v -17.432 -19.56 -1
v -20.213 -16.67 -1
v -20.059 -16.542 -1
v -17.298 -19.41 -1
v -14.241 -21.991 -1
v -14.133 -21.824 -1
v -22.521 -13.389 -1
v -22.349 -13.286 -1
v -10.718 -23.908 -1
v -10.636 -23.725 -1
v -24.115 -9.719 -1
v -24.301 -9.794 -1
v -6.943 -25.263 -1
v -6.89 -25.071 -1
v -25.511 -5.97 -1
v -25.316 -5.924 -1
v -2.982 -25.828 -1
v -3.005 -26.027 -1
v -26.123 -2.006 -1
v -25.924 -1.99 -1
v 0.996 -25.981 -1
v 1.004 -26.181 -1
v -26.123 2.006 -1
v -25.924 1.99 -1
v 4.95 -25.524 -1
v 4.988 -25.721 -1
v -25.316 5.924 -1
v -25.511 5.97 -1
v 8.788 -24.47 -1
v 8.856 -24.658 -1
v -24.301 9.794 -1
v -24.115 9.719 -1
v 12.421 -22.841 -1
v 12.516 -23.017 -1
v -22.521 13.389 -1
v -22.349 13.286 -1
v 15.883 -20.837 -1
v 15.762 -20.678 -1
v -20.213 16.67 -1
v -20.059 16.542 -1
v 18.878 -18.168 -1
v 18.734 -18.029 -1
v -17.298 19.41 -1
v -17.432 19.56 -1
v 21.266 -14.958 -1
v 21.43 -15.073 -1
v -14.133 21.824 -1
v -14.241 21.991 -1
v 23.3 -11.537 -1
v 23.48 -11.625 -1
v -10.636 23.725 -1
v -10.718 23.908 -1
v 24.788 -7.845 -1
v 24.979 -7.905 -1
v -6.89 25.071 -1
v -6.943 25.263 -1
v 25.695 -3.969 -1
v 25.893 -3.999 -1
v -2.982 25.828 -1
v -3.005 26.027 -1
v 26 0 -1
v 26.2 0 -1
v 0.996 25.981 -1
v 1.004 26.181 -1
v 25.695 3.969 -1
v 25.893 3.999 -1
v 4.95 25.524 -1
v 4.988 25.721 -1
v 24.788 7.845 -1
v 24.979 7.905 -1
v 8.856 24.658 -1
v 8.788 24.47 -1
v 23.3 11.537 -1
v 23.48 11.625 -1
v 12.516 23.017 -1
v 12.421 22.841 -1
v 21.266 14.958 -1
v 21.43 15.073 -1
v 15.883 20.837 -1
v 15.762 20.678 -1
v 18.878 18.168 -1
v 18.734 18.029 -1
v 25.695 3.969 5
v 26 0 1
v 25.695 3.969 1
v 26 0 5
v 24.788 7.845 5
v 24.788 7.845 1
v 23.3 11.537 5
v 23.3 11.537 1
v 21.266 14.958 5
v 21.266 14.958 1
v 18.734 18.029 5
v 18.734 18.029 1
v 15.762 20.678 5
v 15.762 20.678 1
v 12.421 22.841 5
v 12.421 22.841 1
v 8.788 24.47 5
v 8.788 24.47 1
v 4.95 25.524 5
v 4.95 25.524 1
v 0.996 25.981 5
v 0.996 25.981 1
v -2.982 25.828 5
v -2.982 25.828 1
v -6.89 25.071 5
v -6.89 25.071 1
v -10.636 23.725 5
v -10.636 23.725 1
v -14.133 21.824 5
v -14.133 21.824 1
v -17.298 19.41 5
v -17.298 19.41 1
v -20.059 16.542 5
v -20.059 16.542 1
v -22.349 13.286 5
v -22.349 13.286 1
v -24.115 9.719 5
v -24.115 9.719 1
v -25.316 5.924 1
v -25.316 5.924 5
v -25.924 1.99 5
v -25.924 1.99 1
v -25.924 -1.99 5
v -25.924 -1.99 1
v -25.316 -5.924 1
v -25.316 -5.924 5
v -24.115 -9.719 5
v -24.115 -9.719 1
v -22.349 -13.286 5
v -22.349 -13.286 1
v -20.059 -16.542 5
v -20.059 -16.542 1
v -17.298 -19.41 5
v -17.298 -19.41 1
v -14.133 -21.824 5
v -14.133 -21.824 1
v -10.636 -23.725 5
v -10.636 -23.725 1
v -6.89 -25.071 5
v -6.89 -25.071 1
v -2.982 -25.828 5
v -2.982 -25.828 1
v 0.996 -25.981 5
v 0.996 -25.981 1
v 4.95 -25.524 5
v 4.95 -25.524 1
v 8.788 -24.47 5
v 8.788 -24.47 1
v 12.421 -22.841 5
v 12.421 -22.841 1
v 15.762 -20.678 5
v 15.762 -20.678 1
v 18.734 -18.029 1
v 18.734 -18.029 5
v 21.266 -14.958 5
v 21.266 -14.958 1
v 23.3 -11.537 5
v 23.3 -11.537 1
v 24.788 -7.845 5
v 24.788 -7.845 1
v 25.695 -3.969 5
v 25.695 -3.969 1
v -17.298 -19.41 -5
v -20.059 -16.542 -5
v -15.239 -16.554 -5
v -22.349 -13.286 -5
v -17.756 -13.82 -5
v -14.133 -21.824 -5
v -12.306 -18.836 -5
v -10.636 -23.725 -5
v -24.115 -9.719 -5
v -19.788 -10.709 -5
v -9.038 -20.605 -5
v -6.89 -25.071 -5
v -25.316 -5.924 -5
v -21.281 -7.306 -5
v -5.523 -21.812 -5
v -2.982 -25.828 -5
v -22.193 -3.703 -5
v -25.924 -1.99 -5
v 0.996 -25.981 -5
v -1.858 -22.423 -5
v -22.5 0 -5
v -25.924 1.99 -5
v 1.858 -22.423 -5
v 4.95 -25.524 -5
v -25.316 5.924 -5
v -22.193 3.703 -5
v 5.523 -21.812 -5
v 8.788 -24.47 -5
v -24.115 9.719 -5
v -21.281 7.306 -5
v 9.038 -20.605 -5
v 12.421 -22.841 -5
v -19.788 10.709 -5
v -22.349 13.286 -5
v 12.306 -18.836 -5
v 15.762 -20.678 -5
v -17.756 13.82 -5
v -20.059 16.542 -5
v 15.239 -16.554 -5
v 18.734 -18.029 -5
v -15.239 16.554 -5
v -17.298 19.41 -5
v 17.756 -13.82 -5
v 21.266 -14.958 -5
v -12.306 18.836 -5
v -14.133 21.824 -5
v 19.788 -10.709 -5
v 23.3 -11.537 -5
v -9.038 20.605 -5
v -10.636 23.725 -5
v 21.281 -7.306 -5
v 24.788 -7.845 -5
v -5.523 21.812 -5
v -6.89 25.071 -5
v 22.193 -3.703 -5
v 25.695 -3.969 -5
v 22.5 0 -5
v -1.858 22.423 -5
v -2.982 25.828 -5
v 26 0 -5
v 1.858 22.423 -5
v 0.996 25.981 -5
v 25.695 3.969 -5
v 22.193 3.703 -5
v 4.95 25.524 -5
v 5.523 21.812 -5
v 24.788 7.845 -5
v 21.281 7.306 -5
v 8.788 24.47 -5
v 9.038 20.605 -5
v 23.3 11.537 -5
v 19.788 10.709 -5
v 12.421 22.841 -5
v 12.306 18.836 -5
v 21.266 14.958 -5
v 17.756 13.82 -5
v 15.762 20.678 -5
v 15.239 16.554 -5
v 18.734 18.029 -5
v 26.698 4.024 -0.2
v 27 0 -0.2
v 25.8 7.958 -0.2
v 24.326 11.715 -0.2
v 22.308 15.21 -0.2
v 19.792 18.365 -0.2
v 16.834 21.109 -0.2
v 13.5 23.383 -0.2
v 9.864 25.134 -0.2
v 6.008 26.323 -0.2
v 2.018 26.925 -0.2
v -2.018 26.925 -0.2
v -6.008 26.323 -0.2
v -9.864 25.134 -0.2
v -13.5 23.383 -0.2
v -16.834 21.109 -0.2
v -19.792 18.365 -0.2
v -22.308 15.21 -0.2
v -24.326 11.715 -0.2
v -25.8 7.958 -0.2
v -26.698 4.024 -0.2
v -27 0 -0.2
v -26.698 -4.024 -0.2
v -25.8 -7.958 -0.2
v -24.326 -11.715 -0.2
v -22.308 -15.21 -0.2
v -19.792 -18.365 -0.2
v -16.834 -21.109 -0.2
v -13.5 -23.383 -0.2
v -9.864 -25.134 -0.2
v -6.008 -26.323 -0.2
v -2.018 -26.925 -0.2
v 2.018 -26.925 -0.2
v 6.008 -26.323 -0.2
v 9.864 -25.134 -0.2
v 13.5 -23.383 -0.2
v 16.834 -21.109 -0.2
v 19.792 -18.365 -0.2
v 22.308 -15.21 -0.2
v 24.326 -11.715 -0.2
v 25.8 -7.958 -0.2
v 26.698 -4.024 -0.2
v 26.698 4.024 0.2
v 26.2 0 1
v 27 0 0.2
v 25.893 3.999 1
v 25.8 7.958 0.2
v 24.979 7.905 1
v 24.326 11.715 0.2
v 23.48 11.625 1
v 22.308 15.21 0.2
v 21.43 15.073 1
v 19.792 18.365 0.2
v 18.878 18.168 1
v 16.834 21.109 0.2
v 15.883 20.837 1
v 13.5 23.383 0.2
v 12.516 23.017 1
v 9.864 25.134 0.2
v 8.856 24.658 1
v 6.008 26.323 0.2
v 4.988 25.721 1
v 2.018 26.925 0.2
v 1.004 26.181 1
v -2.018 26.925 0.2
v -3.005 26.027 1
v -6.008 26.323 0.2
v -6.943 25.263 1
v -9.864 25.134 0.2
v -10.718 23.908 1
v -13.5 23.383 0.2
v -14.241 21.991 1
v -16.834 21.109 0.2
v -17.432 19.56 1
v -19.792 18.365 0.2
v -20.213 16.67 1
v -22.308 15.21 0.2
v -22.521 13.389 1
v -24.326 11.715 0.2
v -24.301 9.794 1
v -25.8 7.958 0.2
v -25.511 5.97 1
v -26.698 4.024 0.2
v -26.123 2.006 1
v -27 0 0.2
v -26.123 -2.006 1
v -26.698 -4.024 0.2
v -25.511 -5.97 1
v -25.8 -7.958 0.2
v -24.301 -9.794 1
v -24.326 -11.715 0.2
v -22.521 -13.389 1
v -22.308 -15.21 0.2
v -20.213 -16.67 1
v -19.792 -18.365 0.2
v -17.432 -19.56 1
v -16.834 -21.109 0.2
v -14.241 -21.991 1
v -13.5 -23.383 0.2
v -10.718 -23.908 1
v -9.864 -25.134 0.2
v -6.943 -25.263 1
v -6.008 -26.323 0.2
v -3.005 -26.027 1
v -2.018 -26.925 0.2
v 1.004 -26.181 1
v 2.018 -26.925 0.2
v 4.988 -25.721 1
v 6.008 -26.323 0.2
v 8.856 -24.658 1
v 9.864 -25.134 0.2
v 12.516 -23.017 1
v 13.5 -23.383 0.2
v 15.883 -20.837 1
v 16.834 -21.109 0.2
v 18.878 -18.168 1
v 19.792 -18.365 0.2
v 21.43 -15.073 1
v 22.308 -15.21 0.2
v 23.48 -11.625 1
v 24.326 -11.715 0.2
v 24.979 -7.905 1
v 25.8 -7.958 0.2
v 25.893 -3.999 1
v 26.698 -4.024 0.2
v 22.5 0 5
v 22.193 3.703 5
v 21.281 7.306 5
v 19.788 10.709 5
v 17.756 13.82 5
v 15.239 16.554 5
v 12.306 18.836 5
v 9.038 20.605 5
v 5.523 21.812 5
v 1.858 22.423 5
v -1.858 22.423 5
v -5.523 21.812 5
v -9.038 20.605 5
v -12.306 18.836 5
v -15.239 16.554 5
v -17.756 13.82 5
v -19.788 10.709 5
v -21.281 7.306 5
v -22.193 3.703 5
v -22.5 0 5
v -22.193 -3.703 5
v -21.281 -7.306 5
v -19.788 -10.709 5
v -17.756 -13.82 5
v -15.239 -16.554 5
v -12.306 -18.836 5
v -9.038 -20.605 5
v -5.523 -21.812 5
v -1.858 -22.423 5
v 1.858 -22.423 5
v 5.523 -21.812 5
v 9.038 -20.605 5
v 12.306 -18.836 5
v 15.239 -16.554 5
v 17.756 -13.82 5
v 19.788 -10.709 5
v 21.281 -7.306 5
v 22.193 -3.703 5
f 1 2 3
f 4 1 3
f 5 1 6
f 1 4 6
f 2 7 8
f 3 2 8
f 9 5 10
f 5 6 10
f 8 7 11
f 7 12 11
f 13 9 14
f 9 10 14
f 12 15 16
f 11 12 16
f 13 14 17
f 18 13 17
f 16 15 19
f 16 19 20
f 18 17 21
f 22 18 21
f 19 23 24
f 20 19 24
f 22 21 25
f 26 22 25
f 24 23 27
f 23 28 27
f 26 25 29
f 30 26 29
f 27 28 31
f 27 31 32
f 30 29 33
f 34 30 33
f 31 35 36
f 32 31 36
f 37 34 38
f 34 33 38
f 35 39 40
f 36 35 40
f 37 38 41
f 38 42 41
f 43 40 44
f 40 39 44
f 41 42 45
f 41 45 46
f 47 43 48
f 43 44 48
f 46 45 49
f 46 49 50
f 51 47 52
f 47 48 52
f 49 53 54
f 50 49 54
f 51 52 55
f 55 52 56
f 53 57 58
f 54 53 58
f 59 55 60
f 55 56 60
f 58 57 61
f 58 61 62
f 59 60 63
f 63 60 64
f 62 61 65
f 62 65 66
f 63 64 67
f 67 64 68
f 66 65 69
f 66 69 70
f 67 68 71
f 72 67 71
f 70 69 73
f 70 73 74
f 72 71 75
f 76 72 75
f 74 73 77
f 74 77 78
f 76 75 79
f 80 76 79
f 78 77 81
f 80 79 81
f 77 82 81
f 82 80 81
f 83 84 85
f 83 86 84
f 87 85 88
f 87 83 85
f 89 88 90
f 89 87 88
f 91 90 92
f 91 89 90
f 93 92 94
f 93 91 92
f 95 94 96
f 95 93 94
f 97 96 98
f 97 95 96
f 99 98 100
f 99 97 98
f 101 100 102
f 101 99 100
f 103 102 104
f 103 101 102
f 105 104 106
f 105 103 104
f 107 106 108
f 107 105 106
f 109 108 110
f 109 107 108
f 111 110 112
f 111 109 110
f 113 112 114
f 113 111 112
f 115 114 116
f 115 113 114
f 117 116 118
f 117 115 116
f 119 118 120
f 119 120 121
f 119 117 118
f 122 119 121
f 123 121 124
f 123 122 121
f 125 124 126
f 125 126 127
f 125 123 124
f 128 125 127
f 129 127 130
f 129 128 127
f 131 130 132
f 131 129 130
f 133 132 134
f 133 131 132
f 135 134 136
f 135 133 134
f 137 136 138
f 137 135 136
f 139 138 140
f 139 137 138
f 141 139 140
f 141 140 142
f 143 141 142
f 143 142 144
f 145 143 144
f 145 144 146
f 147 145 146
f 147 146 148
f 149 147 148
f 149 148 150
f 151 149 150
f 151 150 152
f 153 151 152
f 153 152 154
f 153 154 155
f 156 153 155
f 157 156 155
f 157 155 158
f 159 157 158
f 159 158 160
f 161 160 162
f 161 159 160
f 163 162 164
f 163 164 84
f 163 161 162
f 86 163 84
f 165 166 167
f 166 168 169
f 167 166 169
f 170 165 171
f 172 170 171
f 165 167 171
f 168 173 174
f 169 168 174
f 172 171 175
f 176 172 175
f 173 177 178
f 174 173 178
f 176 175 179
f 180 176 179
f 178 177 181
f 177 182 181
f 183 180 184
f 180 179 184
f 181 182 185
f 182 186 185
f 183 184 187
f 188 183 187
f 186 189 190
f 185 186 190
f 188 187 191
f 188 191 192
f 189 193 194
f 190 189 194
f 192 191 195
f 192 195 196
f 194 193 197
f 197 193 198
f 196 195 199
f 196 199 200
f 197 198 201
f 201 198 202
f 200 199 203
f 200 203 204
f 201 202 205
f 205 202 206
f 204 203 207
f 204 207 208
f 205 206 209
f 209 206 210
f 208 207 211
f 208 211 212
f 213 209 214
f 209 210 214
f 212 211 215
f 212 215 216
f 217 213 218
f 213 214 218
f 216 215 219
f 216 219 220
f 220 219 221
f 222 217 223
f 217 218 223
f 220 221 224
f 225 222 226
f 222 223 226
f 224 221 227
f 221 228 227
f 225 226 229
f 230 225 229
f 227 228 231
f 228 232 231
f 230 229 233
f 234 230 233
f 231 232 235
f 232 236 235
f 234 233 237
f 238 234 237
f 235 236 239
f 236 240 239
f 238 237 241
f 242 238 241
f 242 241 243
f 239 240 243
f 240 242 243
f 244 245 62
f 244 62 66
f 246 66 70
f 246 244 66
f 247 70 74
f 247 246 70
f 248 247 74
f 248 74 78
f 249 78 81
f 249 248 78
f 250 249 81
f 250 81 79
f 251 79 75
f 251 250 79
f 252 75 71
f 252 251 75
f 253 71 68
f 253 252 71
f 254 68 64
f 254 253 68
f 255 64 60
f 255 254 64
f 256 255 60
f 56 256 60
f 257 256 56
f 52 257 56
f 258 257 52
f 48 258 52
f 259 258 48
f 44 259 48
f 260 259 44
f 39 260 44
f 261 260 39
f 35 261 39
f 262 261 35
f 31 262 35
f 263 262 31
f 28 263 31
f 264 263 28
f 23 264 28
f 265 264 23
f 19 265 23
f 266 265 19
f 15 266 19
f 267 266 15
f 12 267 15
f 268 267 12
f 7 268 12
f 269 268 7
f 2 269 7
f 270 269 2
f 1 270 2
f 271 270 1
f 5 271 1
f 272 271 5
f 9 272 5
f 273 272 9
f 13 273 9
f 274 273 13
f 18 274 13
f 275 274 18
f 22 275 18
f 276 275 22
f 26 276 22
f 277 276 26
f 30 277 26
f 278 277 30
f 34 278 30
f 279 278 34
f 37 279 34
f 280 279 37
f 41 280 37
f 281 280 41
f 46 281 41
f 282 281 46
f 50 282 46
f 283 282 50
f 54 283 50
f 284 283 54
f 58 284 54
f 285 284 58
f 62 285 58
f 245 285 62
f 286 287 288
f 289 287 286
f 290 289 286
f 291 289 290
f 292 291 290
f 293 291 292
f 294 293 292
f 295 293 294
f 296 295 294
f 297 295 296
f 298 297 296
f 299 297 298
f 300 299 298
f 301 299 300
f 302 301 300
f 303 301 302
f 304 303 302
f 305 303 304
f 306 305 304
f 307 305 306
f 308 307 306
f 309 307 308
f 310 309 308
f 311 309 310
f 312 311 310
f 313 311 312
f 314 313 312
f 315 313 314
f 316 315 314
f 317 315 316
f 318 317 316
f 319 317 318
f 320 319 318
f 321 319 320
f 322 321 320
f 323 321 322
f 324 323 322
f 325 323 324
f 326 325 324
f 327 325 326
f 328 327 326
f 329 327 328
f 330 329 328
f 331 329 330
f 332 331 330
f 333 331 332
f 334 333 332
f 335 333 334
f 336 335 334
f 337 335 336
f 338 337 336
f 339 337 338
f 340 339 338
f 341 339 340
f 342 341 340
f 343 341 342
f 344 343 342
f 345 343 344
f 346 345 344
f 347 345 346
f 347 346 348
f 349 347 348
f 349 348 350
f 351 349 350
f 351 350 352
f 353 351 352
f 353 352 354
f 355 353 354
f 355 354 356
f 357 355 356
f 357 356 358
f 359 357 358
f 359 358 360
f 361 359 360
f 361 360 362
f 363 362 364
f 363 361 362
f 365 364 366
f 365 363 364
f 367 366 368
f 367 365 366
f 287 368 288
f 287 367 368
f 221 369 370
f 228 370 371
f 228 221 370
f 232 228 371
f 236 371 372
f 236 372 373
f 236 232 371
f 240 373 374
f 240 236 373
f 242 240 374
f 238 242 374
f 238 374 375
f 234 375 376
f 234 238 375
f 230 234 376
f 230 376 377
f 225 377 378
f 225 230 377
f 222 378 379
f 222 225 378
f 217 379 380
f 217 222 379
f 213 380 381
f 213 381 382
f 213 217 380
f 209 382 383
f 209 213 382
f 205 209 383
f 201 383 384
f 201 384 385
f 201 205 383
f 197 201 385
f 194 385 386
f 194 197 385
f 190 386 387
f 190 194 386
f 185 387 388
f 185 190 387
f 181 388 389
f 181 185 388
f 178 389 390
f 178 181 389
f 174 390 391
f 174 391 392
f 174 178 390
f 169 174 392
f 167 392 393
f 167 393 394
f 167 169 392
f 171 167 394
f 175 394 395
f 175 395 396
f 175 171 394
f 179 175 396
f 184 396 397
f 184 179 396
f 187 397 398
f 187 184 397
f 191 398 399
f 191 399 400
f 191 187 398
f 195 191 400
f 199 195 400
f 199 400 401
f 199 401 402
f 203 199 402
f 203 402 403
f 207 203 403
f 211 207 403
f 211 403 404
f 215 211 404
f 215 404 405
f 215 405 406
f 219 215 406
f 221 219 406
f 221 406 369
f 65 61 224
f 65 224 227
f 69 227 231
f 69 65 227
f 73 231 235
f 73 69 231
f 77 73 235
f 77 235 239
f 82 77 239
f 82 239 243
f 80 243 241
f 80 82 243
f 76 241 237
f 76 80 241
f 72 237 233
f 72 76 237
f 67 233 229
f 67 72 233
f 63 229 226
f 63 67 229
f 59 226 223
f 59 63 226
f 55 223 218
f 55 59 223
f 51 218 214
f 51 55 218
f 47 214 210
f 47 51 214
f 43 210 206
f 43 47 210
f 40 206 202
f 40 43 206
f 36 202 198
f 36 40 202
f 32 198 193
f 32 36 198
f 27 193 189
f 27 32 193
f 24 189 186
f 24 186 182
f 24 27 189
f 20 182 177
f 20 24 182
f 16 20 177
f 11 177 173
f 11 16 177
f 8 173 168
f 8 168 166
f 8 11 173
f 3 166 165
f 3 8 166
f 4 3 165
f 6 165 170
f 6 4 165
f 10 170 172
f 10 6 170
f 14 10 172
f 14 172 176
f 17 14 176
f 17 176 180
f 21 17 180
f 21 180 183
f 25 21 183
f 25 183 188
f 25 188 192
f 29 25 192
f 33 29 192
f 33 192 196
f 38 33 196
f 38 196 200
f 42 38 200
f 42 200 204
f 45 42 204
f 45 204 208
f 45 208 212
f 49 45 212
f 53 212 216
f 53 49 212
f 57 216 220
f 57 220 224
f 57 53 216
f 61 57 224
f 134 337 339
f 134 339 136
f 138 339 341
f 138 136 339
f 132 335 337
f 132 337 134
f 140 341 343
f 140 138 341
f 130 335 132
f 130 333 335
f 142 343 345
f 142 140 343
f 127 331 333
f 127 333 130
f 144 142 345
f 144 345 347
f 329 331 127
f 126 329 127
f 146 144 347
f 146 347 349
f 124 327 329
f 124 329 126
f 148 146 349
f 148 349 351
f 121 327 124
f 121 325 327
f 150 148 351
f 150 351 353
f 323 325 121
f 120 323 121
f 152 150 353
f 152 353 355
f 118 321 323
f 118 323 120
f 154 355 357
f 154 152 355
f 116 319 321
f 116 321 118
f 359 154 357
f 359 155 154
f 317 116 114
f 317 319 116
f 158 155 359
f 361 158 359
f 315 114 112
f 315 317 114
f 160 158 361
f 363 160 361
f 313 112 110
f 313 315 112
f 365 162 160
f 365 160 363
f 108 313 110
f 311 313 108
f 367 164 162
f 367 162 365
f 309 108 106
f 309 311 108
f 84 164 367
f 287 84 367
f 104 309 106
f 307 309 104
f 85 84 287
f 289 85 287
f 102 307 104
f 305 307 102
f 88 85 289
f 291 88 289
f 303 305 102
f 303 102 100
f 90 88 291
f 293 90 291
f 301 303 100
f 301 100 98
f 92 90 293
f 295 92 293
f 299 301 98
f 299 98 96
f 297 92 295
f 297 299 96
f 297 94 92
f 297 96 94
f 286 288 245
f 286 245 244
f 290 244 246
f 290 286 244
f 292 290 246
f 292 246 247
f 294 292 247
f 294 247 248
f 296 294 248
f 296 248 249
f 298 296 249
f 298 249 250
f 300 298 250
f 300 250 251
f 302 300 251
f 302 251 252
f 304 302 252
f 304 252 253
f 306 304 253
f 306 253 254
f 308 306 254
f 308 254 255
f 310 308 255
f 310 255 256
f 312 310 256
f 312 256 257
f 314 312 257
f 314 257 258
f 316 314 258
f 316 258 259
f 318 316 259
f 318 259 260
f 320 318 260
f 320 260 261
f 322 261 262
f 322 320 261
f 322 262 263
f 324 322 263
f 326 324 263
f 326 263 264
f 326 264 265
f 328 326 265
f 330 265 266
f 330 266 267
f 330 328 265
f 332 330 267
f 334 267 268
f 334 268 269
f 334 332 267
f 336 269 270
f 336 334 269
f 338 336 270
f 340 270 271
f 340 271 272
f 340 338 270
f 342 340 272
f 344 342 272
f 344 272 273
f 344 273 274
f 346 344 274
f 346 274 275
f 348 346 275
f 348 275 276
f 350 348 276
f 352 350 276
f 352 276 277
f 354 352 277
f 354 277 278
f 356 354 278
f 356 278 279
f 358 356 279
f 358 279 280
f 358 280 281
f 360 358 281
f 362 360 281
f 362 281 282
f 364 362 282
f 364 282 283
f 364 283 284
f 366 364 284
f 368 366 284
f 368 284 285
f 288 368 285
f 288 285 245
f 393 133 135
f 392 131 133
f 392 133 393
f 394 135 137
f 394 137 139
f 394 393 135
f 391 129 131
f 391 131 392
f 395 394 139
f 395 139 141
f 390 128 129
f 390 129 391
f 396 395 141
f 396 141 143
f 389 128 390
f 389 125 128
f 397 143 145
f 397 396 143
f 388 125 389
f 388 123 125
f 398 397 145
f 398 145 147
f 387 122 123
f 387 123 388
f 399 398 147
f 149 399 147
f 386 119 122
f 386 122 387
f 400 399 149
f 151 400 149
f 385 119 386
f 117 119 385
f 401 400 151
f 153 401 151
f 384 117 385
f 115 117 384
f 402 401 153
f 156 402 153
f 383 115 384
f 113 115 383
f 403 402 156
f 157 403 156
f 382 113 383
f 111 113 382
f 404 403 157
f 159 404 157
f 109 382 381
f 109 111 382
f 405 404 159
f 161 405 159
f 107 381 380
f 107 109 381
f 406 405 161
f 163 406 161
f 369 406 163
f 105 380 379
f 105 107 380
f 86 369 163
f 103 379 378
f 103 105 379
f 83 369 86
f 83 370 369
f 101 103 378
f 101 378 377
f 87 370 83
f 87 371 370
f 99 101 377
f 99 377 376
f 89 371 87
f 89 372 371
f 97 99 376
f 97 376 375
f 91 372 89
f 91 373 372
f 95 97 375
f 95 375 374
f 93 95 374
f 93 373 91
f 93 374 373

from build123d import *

# Parameters (mm, degrees)
F0_R     = 27
F0_R_2   = 26
F1_DEPTH = 1
F0_R_3   = 22.5
F2_DEPTH = 5
F3_SIZE  = 0.8


with BuildPart() as f1:
    # F0 (on Top) → F1 (new body, symmetric)
    with BuildSketch(Plane.XY):
        Circle(F0_R)
        Circle(F0_R_2, mode=Mode.SUBTRACT)
    extrude(amount=F1_DEPTH, both=True)

    # F0 (on Top) → F2 (join, symmetric)
    with BuildSketch(Plane.XY):
        Circle(F0_R_2)
        Circle(F0_R_3, mode=Mode.SUBTRACT)
    extrude(amount=F2_DEPTH, both=True)

    # F3
    f3_edges = [f1.edges().sort_by_distance(p)[0] for p in [
        (-27, 0, 1),
        (-27, 0, -1),
    ]]
    chamfer(f3_edges, length=F3_SIZE)


solid = f1.part
